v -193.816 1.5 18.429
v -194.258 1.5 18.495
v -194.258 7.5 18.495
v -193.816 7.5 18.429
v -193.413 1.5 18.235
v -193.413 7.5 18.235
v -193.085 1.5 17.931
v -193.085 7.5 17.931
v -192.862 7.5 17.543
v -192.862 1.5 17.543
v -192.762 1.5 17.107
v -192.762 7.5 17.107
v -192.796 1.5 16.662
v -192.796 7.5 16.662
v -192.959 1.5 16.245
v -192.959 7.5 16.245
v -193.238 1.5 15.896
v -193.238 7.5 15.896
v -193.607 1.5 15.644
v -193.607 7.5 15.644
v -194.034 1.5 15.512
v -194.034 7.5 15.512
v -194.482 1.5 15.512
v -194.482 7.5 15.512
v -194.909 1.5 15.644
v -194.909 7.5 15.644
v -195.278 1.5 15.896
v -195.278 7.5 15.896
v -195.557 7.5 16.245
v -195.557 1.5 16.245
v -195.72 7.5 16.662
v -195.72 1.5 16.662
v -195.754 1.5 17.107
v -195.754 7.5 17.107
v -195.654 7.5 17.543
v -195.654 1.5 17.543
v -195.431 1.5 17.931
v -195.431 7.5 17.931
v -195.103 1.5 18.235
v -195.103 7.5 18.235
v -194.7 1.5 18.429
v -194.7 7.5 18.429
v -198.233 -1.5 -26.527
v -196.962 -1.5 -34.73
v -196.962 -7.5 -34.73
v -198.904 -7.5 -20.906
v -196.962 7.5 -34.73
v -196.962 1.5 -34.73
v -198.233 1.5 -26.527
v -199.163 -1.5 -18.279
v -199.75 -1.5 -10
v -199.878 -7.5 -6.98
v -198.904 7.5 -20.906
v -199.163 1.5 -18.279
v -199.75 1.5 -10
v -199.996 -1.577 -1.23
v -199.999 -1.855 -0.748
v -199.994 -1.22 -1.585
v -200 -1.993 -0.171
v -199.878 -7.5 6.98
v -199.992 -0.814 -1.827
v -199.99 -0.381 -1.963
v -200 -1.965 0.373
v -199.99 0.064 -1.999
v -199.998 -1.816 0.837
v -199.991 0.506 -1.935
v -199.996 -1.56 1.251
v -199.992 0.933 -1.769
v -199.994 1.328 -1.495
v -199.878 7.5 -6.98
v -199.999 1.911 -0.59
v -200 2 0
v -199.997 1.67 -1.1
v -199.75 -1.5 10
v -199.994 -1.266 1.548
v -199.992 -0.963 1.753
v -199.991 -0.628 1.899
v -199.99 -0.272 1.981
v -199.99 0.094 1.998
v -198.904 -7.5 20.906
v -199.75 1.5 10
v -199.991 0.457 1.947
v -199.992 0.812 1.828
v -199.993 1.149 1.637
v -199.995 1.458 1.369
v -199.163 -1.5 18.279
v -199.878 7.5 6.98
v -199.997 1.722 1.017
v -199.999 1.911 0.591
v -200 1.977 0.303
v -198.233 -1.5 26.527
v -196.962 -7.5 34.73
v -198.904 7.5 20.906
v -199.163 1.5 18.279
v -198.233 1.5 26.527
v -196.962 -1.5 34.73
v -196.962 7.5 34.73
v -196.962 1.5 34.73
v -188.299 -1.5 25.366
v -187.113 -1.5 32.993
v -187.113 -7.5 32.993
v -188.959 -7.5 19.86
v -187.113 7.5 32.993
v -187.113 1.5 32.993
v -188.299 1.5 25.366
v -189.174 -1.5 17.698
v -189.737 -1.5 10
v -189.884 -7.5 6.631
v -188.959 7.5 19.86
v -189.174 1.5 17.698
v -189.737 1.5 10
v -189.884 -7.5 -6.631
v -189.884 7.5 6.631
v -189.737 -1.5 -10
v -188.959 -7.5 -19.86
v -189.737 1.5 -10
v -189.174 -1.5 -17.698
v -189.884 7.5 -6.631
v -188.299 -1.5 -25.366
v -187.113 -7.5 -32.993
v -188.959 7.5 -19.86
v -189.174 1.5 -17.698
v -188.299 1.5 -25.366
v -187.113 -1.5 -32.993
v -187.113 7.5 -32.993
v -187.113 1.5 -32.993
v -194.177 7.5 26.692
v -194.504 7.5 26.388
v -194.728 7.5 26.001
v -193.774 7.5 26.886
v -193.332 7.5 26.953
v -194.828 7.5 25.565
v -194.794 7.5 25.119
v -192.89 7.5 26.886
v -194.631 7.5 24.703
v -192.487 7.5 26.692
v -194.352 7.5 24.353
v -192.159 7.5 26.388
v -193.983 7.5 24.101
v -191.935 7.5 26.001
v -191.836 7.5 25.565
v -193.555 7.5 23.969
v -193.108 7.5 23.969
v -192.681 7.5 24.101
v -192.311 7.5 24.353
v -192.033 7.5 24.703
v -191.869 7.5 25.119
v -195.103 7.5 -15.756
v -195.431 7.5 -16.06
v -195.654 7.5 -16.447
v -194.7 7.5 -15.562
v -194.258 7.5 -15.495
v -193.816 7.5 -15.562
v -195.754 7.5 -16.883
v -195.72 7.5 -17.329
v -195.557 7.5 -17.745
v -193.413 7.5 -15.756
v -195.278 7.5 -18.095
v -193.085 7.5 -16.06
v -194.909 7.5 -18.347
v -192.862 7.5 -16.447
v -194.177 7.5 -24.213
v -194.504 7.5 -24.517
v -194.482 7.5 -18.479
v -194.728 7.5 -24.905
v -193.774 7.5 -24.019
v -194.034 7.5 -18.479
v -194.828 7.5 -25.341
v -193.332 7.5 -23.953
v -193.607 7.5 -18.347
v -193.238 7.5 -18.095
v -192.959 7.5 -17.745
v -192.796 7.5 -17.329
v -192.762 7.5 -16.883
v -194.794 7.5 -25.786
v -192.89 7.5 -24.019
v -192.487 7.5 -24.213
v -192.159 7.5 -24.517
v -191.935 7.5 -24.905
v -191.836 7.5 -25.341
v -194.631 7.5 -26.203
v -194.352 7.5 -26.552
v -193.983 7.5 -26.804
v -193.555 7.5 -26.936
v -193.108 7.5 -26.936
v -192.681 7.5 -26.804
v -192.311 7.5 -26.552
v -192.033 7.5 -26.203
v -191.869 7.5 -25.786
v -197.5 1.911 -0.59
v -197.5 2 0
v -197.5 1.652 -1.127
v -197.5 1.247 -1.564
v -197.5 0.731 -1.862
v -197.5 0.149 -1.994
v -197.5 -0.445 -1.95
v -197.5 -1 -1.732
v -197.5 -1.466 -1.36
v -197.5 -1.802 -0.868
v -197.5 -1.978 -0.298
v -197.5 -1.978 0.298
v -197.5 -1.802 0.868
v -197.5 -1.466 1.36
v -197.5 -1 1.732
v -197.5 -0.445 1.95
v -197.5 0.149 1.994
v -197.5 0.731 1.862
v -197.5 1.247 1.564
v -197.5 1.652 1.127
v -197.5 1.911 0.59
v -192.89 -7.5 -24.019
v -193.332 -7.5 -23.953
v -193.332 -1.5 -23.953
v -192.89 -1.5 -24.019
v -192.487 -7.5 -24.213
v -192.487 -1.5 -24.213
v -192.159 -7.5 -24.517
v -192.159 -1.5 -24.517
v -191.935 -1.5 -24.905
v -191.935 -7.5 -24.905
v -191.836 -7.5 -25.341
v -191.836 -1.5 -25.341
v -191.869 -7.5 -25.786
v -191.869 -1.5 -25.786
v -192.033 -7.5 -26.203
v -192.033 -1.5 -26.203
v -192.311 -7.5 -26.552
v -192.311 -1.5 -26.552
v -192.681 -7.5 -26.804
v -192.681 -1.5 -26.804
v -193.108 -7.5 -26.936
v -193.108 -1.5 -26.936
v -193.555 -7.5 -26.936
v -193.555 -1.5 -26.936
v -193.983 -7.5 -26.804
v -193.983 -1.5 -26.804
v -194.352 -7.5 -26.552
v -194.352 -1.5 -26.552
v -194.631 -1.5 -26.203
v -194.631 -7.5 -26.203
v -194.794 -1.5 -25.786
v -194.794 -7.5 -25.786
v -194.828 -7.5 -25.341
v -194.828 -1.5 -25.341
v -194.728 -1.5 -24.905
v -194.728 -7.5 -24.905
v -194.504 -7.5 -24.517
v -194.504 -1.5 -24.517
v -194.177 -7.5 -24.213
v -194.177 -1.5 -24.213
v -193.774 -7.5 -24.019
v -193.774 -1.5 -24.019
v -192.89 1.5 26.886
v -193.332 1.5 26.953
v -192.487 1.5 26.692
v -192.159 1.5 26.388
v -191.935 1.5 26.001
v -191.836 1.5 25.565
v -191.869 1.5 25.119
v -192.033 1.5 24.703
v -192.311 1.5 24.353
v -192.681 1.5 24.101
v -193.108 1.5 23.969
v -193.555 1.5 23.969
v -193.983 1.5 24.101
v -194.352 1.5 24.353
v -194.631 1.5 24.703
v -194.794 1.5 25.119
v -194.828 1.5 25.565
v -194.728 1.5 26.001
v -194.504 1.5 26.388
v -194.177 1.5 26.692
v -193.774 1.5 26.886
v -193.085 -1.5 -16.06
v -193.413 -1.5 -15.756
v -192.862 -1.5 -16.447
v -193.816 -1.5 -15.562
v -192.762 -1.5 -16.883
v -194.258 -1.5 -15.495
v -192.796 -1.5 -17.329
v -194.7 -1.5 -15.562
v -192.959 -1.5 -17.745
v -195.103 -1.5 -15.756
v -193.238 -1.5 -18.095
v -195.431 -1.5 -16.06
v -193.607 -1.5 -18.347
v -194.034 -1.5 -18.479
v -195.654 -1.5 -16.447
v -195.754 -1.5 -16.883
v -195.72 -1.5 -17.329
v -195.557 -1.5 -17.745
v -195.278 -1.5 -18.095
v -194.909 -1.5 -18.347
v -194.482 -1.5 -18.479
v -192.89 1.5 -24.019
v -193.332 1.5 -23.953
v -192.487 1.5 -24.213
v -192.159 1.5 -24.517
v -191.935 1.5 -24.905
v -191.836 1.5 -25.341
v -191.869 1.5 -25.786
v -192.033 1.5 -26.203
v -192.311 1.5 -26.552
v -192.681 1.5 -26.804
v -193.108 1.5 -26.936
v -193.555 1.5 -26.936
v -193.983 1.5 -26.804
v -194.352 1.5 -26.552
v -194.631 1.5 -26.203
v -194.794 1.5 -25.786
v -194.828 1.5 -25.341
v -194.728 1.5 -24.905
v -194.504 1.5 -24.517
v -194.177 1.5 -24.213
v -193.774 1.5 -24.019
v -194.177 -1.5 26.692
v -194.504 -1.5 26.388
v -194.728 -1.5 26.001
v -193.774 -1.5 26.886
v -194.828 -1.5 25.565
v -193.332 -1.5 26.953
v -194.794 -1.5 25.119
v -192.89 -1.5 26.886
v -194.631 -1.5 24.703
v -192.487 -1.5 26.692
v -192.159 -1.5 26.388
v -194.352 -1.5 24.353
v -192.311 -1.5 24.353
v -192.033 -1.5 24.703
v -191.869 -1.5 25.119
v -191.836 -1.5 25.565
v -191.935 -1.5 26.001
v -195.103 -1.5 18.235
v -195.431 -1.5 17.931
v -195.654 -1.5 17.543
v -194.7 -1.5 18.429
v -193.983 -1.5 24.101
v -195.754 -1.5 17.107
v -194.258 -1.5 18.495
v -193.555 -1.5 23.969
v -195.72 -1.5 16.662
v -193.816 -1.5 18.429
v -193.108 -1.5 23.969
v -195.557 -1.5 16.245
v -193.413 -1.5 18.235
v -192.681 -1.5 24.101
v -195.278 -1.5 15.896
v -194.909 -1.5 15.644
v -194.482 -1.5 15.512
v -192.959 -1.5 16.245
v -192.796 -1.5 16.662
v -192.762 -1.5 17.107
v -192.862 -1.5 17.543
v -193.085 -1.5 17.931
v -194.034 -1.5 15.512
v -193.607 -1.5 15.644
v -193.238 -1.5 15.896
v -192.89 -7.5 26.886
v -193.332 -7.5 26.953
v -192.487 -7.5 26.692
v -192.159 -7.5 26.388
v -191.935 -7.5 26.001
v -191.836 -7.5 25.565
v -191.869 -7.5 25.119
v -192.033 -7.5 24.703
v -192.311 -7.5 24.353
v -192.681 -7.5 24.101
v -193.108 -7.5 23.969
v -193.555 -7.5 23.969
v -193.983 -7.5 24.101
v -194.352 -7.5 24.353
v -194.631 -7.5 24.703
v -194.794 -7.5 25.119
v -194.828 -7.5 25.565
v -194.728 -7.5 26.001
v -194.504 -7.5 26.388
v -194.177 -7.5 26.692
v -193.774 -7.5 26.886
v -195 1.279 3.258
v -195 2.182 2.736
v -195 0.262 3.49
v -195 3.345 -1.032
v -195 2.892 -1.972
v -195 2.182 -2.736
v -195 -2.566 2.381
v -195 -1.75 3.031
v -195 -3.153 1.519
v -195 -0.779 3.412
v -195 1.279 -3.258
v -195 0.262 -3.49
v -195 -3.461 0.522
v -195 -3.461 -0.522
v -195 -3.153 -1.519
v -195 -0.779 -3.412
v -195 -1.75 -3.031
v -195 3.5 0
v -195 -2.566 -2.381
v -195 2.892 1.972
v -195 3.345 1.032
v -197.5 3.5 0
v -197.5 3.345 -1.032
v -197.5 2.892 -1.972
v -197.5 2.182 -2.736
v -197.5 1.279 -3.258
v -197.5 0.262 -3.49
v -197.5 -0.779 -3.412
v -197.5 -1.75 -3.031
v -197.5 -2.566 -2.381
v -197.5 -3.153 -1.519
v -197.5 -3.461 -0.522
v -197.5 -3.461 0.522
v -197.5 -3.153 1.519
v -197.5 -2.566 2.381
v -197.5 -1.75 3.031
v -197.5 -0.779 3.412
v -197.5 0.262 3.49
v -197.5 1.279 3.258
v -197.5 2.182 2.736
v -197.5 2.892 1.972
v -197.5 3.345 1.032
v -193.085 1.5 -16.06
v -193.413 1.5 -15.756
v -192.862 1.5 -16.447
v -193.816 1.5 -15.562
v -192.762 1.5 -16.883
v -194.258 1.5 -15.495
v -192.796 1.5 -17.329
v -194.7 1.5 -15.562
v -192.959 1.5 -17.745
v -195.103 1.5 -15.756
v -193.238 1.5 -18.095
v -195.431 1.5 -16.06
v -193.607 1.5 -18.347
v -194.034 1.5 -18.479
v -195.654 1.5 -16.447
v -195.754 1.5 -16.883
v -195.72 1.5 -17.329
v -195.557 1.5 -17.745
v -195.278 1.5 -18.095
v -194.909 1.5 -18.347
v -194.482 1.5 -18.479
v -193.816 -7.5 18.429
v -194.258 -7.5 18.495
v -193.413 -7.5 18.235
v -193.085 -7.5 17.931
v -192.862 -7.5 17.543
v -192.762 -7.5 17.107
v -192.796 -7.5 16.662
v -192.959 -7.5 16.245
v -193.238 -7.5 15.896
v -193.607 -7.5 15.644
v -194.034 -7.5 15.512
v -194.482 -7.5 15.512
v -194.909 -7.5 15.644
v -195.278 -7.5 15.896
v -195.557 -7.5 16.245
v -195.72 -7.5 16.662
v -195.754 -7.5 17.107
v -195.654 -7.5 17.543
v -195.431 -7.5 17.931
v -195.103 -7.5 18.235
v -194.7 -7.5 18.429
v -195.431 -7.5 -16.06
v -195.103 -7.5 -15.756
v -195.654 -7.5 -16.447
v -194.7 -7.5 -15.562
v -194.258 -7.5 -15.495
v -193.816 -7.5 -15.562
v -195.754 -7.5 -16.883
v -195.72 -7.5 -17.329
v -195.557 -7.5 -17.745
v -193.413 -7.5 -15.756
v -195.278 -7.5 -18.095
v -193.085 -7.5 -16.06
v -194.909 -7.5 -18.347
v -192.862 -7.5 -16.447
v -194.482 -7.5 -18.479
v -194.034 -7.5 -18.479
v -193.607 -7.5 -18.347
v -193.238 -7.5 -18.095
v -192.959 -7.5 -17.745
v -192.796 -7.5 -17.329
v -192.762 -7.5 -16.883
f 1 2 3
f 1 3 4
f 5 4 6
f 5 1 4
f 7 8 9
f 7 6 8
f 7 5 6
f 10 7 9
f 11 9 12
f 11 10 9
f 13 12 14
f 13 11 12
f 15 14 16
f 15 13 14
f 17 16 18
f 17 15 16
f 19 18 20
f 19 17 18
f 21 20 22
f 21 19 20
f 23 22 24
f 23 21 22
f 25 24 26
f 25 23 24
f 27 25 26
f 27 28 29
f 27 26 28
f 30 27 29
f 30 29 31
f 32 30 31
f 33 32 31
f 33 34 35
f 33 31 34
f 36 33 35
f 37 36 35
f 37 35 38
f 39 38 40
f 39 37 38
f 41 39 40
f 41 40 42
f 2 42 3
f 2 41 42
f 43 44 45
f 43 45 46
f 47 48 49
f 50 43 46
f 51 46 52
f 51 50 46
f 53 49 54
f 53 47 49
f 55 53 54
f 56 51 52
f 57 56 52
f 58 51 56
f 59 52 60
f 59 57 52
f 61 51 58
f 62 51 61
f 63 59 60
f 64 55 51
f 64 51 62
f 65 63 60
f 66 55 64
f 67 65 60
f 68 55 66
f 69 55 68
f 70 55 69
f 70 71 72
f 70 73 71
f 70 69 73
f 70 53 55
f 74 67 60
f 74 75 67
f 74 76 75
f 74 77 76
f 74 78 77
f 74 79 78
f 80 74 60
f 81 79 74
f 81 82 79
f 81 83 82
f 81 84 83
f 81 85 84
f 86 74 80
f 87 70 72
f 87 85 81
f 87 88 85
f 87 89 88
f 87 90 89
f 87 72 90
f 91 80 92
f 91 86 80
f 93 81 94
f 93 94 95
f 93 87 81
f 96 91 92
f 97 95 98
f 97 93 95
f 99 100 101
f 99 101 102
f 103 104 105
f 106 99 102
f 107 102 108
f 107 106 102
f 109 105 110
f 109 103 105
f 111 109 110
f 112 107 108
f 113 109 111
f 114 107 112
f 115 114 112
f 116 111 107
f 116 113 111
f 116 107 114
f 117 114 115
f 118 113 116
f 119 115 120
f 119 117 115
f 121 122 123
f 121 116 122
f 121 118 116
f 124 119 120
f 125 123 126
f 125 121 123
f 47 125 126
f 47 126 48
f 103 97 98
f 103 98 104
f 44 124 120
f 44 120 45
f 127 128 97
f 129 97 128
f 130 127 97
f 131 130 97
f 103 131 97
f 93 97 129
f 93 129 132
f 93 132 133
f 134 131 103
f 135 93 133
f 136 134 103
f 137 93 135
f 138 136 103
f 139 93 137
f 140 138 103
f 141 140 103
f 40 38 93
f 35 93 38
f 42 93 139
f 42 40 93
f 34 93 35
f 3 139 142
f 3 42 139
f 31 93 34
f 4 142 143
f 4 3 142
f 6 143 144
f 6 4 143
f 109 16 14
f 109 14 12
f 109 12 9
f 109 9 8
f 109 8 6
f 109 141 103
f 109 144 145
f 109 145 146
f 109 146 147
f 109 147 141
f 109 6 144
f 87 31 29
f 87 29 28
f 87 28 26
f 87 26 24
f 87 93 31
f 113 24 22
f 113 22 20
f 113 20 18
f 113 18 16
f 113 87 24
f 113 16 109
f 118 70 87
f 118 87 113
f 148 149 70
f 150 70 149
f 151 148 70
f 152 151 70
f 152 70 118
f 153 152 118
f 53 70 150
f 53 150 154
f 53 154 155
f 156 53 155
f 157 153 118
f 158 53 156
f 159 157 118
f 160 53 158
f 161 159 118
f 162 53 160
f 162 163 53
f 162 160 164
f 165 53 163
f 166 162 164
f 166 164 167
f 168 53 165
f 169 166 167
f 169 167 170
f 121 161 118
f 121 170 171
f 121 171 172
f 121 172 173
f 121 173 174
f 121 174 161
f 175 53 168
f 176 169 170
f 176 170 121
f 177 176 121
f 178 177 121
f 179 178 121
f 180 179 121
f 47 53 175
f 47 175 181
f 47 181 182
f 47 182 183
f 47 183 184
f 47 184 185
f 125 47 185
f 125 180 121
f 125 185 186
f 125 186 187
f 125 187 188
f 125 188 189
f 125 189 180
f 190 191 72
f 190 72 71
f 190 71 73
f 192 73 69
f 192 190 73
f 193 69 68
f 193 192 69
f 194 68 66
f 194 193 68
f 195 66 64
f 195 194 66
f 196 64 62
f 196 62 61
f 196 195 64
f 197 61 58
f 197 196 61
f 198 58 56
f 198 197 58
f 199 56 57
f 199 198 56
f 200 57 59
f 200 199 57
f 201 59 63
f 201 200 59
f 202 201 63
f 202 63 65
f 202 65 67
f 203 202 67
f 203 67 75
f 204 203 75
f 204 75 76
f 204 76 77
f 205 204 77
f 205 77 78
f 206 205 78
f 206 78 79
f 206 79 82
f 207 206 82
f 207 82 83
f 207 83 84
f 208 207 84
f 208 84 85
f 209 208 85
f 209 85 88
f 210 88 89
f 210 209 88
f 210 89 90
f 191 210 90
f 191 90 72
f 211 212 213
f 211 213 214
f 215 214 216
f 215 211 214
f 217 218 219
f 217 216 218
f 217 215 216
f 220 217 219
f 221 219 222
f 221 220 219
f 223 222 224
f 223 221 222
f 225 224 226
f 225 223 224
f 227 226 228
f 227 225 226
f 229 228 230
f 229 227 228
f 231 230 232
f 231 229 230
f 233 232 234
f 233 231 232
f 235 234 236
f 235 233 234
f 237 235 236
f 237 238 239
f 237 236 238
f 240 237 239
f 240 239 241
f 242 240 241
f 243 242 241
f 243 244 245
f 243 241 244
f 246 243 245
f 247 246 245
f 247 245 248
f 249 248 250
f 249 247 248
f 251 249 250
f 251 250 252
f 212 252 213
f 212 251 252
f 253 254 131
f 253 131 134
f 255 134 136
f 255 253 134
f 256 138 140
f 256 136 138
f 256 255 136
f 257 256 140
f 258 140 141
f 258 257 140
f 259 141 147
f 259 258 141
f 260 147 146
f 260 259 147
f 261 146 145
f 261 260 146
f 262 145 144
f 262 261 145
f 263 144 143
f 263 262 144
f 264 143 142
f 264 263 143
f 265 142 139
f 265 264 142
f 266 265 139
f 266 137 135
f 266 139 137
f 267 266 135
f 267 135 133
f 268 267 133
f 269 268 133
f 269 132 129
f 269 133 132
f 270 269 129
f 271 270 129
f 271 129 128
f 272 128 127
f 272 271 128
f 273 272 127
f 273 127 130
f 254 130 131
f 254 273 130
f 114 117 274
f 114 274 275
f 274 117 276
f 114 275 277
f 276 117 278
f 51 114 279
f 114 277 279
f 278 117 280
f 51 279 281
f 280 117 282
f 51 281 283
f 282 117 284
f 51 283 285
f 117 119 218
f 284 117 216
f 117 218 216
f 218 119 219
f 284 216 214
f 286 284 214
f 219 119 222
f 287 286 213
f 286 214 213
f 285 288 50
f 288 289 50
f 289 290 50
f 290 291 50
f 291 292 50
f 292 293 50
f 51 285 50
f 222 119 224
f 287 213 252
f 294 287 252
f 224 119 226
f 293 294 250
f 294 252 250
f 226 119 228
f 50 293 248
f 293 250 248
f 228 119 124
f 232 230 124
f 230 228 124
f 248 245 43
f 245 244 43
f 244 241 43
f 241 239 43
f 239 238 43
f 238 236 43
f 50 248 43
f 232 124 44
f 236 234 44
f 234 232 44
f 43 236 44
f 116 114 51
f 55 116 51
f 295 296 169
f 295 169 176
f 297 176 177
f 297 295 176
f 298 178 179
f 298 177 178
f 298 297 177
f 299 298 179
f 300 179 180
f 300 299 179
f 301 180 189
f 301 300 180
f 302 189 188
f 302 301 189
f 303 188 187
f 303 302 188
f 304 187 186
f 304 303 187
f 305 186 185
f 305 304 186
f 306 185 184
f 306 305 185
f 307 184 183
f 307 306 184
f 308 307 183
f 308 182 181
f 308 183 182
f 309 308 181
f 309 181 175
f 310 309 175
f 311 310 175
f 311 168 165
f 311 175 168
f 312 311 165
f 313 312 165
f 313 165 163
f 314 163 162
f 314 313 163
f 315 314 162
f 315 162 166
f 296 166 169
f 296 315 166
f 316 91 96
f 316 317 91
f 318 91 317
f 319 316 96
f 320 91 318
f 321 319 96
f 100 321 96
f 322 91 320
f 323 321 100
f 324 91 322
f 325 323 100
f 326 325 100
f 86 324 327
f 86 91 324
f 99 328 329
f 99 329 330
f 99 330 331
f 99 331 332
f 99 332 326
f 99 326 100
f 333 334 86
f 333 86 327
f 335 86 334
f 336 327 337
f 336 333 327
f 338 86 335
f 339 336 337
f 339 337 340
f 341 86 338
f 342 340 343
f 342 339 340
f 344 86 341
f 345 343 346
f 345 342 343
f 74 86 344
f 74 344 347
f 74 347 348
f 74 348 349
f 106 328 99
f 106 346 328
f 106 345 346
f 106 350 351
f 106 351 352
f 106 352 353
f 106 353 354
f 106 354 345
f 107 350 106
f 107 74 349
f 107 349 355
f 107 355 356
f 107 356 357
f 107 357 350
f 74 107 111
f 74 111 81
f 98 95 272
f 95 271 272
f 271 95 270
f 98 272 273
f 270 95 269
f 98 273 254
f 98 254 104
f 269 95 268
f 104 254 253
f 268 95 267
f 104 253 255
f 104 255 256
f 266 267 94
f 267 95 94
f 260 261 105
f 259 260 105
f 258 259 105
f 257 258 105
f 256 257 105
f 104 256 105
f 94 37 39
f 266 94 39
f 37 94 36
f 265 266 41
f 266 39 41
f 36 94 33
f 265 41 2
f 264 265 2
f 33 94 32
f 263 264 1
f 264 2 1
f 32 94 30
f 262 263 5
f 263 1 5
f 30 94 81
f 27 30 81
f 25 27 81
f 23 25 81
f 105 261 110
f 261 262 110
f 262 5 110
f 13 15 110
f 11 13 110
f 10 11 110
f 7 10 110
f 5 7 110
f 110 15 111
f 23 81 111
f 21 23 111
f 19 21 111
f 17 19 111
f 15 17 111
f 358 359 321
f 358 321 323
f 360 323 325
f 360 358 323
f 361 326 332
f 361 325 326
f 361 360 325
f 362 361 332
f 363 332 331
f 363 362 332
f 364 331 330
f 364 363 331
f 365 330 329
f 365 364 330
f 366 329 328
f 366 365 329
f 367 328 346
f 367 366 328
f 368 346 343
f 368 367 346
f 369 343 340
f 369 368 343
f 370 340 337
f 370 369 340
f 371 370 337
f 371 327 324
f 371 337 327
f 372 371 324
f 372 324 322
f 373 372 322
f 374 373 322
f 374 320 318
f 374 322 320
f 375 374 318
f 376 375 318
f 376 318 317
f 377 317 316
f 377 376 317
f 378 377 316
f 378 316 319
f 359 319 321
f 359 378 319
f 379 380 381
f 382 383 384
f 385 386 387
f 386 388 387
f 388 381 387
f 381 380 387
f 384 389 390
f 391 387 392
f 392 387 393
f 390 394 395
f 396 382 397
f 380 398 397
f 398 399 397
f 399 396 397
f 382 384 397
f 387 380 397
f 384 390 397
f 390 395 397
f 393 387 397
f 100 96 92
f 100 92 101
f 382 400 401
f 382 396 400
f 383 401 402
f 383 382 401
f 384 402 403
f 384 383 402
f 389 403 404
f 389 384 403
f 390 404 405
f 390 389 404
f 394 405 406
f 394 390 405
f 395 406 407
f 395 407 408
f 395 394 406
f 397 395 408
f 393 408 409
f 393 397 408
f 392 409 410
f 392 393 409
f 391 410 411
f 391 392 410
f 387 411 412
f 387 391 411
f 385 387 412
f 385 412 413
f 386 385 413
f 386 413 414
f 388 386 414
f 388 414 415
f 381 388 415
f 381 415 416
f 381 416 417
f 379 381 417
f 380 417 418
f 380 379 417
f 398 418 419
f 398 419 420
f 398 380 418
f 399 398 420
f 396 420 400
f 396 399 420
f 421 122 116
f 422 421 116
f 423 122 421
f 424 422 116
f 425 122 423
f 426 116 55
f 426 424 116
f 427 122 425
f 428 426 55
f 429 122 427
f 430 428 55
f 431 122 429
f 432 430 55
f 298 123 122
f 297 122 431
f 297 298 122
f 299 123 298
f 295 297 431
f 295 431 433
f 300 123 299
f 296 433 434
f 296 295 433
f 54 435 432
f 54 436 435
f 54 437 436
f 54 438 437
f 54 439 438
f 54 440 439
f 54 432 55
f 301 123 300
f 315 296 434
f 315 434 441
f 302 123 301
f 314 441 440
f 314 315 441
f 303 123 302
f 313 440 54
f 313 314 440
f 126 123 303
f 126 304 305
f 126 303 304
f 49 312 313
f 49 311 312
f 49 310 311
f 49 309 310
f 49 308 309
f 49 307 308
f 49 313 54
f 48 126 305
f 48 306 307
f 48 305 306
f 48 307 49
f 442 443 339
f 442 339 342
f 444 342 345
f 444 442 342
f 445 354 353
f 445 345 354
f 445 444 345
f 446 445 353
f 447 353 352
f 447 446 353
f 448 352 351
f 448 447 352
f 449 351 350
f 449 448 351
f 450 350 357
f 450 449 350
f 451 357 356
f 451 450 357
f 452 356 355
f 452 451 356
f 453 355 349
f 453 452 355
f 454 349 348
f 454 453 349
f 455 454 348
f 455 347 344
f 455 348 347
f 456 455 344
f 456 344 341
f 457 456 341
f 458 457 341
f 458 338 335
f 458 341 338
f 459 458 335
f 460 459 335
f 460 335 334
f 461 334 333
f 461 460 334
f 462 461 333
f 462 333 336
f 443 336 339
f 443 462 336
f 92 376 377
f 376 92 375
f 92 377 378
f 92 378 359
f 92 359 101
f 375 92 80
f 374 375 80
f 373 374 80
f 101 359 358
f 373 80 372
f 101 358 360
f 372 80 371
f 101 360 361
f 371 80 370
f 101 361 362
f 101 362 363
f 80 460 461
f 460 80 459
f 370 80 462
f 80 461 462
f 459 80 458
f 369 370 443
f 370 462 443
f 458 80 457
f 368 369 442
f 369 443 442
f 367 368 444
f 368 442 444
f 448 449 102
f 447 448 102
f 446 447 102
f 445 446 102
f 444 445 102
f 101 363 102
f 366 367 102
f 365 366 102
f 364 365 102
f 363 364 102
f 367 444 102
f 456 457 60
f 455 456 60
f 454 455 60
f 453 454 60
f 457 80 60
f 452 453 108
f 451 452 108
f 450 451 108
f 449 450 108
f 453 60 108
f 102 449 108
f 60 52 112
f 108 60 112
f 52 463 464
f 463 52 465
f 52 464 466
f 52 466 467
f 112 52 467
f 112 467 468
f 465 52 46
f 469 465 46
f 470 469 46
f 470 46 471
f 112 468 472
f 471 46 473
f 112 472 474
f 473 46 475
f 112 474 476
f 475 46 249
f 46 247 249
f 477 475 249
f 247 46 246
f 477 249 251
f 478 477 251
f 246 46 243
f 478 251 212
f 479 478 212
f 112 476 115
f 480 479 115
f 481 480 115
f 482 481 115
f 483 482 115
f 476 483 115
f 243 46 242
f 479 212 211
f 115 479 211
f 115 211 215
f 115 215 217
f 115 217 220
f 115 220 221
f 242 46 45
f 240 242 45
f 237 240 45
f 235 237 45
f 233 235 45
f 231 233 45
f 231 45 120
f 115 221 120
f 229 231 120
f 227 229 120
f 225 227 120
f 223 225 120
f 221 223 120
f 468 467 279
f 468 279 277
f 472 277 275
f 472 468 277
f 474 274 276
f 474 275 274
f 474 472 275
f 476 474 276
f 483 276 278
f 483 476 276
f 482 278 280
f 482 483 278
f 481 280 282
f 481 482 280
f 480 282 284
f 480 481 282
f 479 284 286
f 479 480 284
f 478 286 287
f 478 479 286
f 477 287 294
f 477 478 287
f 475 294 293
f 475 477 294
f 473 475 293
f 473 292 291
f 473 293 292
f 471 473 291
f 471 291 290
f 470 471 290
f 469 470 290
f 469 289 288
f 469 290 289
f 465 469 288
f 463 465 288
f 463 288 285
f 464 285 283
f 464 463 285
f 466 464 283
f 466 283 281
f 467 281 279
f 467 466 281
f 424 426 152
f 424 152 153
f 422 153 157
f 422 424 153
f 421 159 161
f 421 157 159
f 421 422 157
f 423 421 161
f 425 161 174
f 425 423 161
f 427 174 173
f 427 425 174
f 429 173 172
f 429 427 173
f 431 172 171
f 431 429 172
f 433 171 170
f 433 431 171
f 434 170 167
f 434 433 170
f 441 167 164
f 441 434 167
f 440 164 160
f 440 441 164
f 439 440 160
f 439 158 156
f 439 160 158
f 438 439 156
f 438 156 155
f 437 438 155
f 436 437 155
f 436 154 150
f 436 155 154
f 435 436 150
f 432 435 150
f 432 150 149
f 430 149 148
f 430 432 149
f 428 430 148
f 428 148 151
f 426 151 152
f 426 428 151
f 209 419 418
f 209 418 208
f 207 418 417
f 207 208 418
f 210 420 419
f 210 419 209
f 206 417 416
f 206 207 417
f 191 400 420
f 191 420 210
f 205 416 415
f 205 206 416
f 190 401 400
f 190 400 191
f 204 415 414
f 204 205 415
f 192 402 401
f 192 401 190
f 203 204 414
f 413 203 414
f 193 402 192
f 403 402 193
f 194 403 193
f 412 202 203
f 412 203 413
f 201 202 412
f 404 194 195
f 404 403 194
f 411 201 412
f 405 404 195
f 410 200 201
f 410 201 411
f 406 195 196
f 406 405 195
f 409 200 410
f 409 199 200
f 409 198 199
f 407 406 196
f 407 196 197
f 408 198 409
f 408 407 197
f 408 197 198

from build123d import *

# Parameters (mm, degrees)
BASE_DEPTH            = 7.5
MOUNT_START           = -1.5
MOUNT_DEPTH           = 3
MOUNT_HOLE_DEPTH      = 204.131478566
MOUNT_HOLE_DEPTH_BACK = 204.131478566
SKETCH12_R            = 1.5
SKETCH14_R            = 2
SHAFT_HOLE_DEPTH      = 37.394984425
SKETCH13_W            = 2.5
SKETCH13_H            = 3.5


with BuildPart() as part:
    # Sketch9 → base (new, symmetric)
    with BuildSketch(Plane(origin=(0, 0, 0), x_dir=(1, 0, 0), z_dir=(0, 1, 0))):
        with BuildLine():
            ThreePointArc((-187.113473072, -32.993153757), (-190, 0), (-187.113473072, 32.993153757))
            Line((-187.113473072, 32.993153757), (-196.961550602, 34.729635533))
            ThreePointArc((-196.961550602, 34.729635533), (-200, 0), (-196.961550602, -34.729635533))
            Line((-196.961550602, -34.729635533), (-187.113473072, -32.993153757))
        make_face()
    extrude(amount=BASE_DEPTH, both=True)

    # Sketch11 → mount (cut)
    with BuildSketch(Plane(origin=(0, 0, 0), x_dir=(1, 0, 0), z_dir=(0, 1, 0)).offset(MOUNT_START)):
        with BuildLine():
            Line((-189.73665961, -10), (-199.749843554, -10))
            ThreePointArc((-199.749843554, -10), (-198.7407137, -22.408228804), (-196.961550602, -34.729635533))
            Line((-196.961550602, -34.729635533), (-187.113473072, -32.993153757))
            ThreePointArc((-187.113473072, -32.993153757), (-188.775466906, -21.536552519), (-189.73665961, -10))
        make_face()
        with BuildLine():
            Line((-189.73665961, 10), (-199.749843554, 10))
            ThreePointArc((-199.749843554, 10), (-198.7407137, 22.408228804), (-196.961550602, 34.729635533))
            Line((-196.961550602, 34.729635533), (-187.113473072, 32.993153757))
            ThreePointArc((-187.113473072, 32.993153757), (-188.775466906, 21.536552519), (-189.73665961, 10))
        make_face()
    extrude(amount=MOUNT_DEPTH, mode=Mode.SUBTRACT)

    # Sketch12 → mount hole (cut, two sides: drawn at the far end of the back side and taken through both)
    with BuildSketch(Plane(origin=(0, 0, 0), x_dir=(1, 0, 0), z_dir=(0, 1, 0)).offset(-MOUNT_HOLE_DEPTH_BACK)):
        with Locations(Location((-193.331747968, 25.452607483, 0), (0, 0, 270))):
            Circle(SKETCH12_R)
        with Locations(Location((-194.257966128, 16.995369836, 0), (0, 0, 270))):
            Circle(SKETCH12_R)
        with Locations(Location((-194.257966128, -16.995369836, 0), (0, 0, 270))):
            Circle(SKETCH12_R)
        with Locations(Location((-193.331747968, -25.452607483, 0), (0, 0, 270))):
            Circle(SKETCH12_R)
    extrude(amount=MOUNT_HOLE_DEPTH + MOUNT_HOLE_DEPTH_BACK, mode=Mode.SUBTRACT)

    # Sketch14 → shaft hole (cut, through all)
    with BuildSketch(Plane.ZY.offset(195)):
        with Locations(Location((0, 0, 0), (0, 0, 90))):
            Circle(SKETCH14_R)
    extrude(amount=SHAFT_HOLE_DEPTH, mode=Mode.SUBTRACT)

    # Sketch13 → bearinghole (revolve, cut)
    with BuildSketch(Plane(origin=(0, 0, 0), x_dir=(1, 0, 0), z_dir=(0, 1, 0)), mode=Mode.PRIVATE) as bearinghole_sk:
        with Locations((-196.25, 1.75)):
            Rectangle(SKETCH13_W, SKETCH13_H)
    revolve(bearinghole_sk.sketch.rotate(Axis((0, 0, 0), (-1, 0, 0)), 270), axis=Axis((0, 0, 0), (-1, 0, 0)), mode=Mode.SUBTRACT)


solid = part.part
